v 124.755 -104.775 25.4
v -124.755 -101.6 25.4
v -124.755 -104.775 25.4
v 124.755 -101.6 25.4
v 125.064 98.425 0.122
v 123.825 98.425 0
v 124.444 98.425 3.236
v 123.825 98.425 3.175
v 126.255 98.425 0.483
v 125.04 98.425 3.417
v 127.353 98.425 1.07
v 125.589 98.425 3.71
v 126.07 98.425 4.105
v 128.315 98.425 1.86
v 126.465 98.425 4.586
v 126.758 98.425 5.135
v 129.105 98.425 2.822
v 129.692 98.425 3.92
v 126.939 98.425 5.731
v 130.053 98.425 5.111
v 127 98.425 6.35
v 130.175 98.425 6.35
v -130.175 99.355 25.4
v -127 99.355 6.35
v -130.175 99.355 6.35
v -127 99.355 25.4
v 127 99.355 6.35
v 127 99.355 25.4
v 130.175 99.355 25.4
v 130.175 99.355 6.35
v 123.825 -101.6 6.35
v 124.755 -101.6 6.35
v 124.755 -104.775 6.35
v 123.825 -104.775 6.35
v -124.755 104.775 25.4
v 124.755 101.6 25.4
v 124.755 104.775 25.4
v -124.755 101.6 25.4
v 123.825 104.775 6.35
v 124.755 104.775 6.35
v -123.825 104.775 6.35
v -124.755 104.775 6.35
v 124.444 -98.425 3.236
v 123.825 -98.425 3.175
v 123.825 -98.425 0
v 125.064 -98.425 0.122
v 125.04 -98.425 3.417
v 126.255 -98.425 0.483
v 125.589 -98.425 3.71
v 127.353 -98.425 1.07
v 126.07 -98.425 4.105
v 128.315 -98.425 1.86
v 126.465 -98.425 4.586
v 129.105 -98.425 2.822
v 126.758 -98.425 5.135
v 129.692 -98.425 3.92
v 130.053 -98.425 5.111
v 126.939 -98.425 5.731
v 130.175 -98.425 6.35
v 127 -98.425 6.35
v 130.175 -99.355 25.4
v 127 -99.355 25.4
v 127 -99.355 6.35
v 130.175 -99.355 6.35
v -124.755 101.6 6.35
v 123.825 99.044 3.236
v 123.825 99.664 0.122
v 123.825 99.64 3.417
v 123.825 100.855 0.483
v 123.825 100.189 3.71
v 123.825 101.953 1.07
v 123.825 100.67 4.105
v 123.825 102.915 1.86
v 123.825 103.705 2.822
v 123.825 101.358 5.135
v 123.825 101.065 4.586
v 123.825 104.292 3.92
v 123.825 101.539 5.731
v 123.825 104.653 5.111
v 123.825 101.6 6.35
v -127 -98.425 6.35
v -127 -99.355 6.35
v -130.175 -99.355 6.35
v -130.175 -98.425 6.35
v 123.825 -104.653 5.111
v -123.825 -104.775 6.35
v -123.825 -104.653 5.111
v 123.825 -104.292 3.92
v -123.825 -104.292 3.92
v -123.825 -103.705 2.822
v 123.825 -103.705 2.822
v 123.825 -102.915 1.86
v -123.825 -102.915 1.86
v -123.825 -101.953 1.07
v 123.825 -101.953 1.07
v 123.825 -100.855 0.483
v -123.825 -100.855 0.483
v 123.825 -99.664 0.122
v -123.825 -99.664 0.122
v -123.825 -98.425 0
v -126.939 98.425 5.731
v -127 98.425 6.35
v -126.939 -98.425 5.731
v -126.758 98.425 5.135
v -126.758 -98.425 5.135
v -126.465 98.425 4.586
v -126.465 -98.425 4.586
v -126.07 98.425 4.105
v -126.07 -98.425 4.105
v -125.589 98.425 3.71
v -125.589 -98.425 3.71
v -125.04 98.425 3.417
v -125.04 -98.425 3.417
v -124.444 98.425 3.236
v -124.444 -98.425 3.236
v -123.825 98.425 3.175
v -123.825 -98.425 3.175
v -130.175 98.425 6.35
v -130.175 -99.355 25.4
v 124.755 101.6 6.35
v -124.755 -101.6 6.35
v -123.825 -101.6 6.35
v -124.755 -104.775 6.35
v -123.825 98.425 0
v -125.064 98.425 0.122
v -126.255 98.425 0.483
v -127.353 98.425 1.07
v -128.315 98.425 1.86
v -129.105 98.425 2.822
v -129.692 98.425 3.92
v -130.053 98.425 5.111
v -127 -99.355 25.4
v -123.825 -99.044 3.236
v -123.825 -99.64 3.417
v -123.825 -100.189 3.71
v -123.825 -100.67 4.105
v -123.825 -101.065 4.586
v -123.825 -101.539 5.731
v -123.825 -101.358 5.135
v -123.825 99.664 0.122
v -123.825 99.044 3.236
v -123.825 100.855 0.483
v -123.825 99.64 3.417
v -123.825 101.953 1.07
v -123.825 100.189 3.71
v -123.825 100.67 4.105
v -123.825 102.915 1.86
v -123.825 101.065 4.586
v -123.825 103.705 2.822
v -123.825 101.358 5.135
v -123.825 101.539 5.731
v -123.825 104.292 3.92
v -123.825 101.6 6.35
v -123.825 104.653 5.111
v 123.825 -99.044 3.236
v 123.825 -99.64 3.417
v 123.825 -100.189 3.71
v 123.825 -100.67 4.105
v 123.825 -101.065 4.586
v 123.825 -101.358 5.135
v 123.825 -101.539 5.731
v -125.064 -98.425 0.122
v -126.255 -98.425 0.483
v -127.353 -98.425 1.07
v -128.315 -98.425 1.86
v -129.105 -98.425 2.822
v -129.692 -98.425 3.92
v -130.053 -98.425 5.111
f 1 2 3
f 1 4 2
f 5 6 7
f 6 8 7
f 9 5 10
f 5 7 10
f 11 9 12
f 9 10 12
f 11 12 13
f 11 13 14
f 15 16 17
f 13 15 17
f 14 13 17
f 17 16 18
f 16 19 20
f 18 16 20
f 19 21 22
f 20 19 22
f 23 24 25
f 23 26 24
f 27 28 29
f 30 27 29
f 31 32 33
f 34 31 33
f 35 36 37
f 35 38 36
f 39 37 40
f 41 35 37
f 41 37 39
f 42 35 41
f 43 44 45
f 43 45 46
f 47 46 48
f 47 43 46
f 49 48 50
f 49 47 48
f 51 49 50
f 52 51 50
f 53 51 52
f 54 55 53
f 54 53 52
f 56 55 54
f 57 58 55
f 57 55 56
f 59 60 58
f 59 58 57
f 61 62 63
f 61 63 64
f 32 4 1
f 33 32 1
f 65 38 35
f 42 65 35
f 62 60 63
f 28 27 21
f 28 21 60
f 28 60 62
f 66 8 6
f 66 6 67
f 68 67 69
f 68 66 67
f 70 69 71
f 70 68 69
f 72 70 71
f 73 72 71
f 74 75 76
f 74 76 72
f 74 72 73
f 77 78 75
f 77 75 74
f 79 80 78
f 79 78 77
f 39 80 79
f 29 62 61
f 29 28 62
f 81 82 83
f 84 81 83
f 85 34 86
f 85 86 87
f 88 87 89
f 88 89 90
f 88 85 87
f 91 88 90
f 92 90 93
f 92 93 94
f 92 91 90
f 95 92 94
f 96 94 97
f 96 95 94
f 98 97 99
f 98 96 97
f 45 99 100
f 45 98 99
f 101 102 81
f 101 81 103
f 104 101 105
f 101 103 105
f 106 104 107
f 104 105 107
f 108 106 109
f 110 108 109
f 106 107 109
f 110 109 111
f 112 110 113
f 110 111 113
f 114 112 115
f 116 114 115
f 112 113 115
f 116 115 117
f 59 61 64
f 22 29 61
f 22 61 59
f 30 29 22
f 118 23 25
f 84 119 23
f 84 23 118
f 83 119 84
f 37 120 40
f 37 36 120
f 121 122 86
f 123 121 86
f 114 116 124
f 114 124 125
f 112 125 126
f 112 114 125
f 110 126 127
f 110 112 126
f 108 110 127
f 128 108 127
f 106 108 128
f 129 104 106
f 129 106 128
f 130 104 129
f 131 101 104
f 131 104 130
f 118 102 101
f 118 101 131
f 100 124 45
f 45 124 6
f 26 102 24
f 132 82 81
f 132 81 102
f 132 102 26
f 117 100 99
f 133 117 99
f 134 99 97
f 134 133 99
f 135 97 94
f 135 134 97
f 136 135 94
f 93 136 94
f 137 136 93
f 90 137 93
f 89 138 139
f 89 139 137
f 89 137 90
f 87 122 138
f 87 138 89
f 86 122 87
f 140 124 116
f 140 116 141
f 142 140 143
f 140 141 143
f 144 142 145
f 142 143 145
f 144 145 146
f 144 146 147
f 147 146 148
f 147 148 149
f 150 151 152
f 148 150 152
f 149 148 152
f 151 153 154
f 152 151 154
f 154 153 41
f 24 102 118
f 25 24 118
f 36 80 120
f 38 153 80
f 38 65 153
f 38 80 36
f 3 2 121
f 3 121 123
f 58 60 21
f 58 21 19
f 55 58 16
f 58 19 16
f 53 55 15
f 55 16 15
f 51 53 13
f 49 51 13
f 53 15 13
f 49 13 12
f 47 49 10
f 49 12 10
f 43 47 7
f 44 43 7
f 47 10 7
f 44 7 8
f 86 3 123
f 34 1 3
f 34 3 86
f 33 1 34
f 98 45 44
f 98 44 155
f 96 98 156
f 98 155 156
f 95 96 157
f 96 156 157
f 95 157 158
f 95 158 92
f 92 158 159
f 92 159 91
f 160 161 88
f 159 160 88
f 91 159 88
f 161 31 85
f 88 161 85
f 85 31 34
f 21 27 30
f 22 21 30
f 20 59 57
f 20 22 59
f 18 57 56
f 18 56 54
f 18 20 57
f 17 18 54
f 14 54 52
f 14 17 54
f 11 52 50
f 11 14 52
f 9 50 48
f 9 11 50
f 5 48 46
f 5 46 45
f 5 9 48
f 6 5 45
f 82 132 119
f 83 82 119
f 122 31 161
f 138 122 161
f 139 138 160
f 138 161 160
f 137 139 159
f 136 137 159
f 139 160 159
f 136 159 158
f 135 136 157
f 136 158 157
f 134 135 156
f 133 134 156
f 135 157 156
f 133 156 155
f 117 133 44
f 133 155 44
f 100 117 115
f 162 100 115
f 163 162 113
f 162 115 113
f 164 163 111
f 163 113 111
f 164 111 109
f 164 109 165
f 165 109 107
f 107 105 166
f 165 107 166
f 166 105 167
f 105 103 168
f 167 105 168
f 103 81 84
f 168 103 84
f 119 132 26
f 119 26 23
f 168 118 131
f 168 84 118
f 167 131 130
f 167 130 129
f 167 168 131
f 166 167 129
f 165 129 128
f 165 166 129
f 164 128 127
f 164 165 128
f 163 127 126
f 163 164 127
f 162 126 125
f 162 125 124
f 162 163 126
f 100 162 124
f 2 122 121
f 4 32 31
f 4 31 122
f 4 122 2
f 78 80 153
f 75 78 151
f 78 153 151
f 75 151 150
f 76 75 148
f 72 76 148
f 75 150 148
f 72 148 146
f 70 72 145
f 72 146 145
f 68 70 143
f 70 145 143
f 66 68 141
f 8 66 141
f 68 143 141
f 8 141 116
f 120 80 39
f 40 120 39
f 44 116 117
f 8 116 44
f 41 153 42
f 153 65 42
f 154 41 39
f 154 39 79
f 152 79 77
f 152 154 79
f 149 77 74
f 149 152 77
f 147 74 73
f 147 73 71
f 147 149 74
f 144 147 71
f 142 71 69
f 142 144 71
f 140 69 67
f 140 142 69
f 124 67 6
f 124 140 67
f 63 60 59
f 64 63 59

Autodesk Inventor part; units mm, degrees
ref_plane "YZ Plane" through (0, 0, 0) normal (1, 0, 0) x (0, 1, 0)
ref_plane "XZ Plane" through (0, 0, 0) normal (0, 1, 0) x (-1, 0, 0)
ref_plane "XY Plane" through (0, 0, 0) normal (0, 0, 1) x (1, 0, 0)
sketch "Sketch1" plane through (0, 0, 0) normal (0, 0, 1) x (1, 0, 0)
  line L0 (130.175, -104.775) -> (-130.175, -104.775)
  line L1 (-130.175, -104.775) -> (-130.175, 104.775)
  line L2 (-130.175, 104.775) -> (130.175, 104.775)
  line L3 (130.175, 104.775) -> (130.175, -104.775)
  line L4 (130.175, -104.775) -> (-130.175, 104.775) construction
  line L5 (-130.175, -104.775) -> (130.175, 104.775) construction
  point P0 (0, 0)
  dimension "d0" = 260.35
  dimension "d1" = 209.55
extrude "Plate1" add sketch "Sketch1" along normal blind 3.175
sketch "Sketch2" plane through (130.175, -101.6, 0) normal (0, -1, 0) x (1, 0, 0)
  line L0 (-260.35, 0) -> (0, 0)
  line L1 (0, 0) -> (0, 25.4)
  line L2 (0, 25.4) -> (-260.35, 25.4)
  line L3 (-260.35, 25.4) -> (-260.35, 0)
edge flange "Flange1" height 25.4 angle 90 thickness 3.175 bend radius 3.175 thickness toward (0, -1, 0) relief tear relief width 3.175 relief depth 1.5875 corner gap 3.175 corner form 2 edges at (0, -104.775, 3.175) (130.175, 0, 3.175) (0, 104.775, 3.175) (-130.175, 0, 3.175) wall of the first edge with corners at (-130.175, -101.6, 0) (130.175, -101.6, 0) (130.175, -101.6, 25.4) (-130.175, -101.6, 25.4)
bend "Bend1"
corner "Corner1"
equation "\"d0\" = MachineMaxLength - 2 * Thickness"
equation "\"d1\" = MachineMaxWidth - 2 * Thickness"
equation "\"d2\" = Thickness"
equation "\"d3\" = BendReliefWidth"
equation "\"d4\" = BendReliefDepth"
equation "\"d5\" = MinimumRemnant"
equation "\"d6\" = TransitionRadius"
equation "\"d9\" = BendRadius"
equation "\"d10\" = CornerReliefSize"
equation "\"d11\" = GapSize"
equation "\"d12\" = JacobiRadiusSize"
equation "\"BendRadius\" = Thickness"
equation "\"BendReliefWidth\" = Thickness"
equation "\"BendReliefDepth\" = 0.5 * Thickness"
equation "\"CornerReliefSize\" = 4 * Thickness"
equation "\"MinimumRemnant\" = 2 * Thickness"
equation "\"TransitionRadius\" = BendRadius"
equation "\"JacobiRadiusSize\" = BendRadius"
equation "\"GapSize\" = Thickness"
equation "\"MachineMaxHeight\" = 539.75"
equation "\"MachineMaxWidth\" = 215.9"
equation "\"MachineMaxLength\" = 266.7"
equation "\"MachineFluidCapacity\" = 25.4"
equation "\"MaxCompressiveCapacity\" = 20320"
equation "\"WashChamberOD\" = 114.3"
equation "\"WashChamberID\" = 101.6"
equation "\"ConduitThickness\" = 152.4"
equation "\"SealedSurfaceOffset\" = 0.15875"
equation "\"StaticORingThickness\" = 4.7625"
equation "\"Thickness\" = 3.175"
properties part number "FrameBase" material "Stainless Steel"
